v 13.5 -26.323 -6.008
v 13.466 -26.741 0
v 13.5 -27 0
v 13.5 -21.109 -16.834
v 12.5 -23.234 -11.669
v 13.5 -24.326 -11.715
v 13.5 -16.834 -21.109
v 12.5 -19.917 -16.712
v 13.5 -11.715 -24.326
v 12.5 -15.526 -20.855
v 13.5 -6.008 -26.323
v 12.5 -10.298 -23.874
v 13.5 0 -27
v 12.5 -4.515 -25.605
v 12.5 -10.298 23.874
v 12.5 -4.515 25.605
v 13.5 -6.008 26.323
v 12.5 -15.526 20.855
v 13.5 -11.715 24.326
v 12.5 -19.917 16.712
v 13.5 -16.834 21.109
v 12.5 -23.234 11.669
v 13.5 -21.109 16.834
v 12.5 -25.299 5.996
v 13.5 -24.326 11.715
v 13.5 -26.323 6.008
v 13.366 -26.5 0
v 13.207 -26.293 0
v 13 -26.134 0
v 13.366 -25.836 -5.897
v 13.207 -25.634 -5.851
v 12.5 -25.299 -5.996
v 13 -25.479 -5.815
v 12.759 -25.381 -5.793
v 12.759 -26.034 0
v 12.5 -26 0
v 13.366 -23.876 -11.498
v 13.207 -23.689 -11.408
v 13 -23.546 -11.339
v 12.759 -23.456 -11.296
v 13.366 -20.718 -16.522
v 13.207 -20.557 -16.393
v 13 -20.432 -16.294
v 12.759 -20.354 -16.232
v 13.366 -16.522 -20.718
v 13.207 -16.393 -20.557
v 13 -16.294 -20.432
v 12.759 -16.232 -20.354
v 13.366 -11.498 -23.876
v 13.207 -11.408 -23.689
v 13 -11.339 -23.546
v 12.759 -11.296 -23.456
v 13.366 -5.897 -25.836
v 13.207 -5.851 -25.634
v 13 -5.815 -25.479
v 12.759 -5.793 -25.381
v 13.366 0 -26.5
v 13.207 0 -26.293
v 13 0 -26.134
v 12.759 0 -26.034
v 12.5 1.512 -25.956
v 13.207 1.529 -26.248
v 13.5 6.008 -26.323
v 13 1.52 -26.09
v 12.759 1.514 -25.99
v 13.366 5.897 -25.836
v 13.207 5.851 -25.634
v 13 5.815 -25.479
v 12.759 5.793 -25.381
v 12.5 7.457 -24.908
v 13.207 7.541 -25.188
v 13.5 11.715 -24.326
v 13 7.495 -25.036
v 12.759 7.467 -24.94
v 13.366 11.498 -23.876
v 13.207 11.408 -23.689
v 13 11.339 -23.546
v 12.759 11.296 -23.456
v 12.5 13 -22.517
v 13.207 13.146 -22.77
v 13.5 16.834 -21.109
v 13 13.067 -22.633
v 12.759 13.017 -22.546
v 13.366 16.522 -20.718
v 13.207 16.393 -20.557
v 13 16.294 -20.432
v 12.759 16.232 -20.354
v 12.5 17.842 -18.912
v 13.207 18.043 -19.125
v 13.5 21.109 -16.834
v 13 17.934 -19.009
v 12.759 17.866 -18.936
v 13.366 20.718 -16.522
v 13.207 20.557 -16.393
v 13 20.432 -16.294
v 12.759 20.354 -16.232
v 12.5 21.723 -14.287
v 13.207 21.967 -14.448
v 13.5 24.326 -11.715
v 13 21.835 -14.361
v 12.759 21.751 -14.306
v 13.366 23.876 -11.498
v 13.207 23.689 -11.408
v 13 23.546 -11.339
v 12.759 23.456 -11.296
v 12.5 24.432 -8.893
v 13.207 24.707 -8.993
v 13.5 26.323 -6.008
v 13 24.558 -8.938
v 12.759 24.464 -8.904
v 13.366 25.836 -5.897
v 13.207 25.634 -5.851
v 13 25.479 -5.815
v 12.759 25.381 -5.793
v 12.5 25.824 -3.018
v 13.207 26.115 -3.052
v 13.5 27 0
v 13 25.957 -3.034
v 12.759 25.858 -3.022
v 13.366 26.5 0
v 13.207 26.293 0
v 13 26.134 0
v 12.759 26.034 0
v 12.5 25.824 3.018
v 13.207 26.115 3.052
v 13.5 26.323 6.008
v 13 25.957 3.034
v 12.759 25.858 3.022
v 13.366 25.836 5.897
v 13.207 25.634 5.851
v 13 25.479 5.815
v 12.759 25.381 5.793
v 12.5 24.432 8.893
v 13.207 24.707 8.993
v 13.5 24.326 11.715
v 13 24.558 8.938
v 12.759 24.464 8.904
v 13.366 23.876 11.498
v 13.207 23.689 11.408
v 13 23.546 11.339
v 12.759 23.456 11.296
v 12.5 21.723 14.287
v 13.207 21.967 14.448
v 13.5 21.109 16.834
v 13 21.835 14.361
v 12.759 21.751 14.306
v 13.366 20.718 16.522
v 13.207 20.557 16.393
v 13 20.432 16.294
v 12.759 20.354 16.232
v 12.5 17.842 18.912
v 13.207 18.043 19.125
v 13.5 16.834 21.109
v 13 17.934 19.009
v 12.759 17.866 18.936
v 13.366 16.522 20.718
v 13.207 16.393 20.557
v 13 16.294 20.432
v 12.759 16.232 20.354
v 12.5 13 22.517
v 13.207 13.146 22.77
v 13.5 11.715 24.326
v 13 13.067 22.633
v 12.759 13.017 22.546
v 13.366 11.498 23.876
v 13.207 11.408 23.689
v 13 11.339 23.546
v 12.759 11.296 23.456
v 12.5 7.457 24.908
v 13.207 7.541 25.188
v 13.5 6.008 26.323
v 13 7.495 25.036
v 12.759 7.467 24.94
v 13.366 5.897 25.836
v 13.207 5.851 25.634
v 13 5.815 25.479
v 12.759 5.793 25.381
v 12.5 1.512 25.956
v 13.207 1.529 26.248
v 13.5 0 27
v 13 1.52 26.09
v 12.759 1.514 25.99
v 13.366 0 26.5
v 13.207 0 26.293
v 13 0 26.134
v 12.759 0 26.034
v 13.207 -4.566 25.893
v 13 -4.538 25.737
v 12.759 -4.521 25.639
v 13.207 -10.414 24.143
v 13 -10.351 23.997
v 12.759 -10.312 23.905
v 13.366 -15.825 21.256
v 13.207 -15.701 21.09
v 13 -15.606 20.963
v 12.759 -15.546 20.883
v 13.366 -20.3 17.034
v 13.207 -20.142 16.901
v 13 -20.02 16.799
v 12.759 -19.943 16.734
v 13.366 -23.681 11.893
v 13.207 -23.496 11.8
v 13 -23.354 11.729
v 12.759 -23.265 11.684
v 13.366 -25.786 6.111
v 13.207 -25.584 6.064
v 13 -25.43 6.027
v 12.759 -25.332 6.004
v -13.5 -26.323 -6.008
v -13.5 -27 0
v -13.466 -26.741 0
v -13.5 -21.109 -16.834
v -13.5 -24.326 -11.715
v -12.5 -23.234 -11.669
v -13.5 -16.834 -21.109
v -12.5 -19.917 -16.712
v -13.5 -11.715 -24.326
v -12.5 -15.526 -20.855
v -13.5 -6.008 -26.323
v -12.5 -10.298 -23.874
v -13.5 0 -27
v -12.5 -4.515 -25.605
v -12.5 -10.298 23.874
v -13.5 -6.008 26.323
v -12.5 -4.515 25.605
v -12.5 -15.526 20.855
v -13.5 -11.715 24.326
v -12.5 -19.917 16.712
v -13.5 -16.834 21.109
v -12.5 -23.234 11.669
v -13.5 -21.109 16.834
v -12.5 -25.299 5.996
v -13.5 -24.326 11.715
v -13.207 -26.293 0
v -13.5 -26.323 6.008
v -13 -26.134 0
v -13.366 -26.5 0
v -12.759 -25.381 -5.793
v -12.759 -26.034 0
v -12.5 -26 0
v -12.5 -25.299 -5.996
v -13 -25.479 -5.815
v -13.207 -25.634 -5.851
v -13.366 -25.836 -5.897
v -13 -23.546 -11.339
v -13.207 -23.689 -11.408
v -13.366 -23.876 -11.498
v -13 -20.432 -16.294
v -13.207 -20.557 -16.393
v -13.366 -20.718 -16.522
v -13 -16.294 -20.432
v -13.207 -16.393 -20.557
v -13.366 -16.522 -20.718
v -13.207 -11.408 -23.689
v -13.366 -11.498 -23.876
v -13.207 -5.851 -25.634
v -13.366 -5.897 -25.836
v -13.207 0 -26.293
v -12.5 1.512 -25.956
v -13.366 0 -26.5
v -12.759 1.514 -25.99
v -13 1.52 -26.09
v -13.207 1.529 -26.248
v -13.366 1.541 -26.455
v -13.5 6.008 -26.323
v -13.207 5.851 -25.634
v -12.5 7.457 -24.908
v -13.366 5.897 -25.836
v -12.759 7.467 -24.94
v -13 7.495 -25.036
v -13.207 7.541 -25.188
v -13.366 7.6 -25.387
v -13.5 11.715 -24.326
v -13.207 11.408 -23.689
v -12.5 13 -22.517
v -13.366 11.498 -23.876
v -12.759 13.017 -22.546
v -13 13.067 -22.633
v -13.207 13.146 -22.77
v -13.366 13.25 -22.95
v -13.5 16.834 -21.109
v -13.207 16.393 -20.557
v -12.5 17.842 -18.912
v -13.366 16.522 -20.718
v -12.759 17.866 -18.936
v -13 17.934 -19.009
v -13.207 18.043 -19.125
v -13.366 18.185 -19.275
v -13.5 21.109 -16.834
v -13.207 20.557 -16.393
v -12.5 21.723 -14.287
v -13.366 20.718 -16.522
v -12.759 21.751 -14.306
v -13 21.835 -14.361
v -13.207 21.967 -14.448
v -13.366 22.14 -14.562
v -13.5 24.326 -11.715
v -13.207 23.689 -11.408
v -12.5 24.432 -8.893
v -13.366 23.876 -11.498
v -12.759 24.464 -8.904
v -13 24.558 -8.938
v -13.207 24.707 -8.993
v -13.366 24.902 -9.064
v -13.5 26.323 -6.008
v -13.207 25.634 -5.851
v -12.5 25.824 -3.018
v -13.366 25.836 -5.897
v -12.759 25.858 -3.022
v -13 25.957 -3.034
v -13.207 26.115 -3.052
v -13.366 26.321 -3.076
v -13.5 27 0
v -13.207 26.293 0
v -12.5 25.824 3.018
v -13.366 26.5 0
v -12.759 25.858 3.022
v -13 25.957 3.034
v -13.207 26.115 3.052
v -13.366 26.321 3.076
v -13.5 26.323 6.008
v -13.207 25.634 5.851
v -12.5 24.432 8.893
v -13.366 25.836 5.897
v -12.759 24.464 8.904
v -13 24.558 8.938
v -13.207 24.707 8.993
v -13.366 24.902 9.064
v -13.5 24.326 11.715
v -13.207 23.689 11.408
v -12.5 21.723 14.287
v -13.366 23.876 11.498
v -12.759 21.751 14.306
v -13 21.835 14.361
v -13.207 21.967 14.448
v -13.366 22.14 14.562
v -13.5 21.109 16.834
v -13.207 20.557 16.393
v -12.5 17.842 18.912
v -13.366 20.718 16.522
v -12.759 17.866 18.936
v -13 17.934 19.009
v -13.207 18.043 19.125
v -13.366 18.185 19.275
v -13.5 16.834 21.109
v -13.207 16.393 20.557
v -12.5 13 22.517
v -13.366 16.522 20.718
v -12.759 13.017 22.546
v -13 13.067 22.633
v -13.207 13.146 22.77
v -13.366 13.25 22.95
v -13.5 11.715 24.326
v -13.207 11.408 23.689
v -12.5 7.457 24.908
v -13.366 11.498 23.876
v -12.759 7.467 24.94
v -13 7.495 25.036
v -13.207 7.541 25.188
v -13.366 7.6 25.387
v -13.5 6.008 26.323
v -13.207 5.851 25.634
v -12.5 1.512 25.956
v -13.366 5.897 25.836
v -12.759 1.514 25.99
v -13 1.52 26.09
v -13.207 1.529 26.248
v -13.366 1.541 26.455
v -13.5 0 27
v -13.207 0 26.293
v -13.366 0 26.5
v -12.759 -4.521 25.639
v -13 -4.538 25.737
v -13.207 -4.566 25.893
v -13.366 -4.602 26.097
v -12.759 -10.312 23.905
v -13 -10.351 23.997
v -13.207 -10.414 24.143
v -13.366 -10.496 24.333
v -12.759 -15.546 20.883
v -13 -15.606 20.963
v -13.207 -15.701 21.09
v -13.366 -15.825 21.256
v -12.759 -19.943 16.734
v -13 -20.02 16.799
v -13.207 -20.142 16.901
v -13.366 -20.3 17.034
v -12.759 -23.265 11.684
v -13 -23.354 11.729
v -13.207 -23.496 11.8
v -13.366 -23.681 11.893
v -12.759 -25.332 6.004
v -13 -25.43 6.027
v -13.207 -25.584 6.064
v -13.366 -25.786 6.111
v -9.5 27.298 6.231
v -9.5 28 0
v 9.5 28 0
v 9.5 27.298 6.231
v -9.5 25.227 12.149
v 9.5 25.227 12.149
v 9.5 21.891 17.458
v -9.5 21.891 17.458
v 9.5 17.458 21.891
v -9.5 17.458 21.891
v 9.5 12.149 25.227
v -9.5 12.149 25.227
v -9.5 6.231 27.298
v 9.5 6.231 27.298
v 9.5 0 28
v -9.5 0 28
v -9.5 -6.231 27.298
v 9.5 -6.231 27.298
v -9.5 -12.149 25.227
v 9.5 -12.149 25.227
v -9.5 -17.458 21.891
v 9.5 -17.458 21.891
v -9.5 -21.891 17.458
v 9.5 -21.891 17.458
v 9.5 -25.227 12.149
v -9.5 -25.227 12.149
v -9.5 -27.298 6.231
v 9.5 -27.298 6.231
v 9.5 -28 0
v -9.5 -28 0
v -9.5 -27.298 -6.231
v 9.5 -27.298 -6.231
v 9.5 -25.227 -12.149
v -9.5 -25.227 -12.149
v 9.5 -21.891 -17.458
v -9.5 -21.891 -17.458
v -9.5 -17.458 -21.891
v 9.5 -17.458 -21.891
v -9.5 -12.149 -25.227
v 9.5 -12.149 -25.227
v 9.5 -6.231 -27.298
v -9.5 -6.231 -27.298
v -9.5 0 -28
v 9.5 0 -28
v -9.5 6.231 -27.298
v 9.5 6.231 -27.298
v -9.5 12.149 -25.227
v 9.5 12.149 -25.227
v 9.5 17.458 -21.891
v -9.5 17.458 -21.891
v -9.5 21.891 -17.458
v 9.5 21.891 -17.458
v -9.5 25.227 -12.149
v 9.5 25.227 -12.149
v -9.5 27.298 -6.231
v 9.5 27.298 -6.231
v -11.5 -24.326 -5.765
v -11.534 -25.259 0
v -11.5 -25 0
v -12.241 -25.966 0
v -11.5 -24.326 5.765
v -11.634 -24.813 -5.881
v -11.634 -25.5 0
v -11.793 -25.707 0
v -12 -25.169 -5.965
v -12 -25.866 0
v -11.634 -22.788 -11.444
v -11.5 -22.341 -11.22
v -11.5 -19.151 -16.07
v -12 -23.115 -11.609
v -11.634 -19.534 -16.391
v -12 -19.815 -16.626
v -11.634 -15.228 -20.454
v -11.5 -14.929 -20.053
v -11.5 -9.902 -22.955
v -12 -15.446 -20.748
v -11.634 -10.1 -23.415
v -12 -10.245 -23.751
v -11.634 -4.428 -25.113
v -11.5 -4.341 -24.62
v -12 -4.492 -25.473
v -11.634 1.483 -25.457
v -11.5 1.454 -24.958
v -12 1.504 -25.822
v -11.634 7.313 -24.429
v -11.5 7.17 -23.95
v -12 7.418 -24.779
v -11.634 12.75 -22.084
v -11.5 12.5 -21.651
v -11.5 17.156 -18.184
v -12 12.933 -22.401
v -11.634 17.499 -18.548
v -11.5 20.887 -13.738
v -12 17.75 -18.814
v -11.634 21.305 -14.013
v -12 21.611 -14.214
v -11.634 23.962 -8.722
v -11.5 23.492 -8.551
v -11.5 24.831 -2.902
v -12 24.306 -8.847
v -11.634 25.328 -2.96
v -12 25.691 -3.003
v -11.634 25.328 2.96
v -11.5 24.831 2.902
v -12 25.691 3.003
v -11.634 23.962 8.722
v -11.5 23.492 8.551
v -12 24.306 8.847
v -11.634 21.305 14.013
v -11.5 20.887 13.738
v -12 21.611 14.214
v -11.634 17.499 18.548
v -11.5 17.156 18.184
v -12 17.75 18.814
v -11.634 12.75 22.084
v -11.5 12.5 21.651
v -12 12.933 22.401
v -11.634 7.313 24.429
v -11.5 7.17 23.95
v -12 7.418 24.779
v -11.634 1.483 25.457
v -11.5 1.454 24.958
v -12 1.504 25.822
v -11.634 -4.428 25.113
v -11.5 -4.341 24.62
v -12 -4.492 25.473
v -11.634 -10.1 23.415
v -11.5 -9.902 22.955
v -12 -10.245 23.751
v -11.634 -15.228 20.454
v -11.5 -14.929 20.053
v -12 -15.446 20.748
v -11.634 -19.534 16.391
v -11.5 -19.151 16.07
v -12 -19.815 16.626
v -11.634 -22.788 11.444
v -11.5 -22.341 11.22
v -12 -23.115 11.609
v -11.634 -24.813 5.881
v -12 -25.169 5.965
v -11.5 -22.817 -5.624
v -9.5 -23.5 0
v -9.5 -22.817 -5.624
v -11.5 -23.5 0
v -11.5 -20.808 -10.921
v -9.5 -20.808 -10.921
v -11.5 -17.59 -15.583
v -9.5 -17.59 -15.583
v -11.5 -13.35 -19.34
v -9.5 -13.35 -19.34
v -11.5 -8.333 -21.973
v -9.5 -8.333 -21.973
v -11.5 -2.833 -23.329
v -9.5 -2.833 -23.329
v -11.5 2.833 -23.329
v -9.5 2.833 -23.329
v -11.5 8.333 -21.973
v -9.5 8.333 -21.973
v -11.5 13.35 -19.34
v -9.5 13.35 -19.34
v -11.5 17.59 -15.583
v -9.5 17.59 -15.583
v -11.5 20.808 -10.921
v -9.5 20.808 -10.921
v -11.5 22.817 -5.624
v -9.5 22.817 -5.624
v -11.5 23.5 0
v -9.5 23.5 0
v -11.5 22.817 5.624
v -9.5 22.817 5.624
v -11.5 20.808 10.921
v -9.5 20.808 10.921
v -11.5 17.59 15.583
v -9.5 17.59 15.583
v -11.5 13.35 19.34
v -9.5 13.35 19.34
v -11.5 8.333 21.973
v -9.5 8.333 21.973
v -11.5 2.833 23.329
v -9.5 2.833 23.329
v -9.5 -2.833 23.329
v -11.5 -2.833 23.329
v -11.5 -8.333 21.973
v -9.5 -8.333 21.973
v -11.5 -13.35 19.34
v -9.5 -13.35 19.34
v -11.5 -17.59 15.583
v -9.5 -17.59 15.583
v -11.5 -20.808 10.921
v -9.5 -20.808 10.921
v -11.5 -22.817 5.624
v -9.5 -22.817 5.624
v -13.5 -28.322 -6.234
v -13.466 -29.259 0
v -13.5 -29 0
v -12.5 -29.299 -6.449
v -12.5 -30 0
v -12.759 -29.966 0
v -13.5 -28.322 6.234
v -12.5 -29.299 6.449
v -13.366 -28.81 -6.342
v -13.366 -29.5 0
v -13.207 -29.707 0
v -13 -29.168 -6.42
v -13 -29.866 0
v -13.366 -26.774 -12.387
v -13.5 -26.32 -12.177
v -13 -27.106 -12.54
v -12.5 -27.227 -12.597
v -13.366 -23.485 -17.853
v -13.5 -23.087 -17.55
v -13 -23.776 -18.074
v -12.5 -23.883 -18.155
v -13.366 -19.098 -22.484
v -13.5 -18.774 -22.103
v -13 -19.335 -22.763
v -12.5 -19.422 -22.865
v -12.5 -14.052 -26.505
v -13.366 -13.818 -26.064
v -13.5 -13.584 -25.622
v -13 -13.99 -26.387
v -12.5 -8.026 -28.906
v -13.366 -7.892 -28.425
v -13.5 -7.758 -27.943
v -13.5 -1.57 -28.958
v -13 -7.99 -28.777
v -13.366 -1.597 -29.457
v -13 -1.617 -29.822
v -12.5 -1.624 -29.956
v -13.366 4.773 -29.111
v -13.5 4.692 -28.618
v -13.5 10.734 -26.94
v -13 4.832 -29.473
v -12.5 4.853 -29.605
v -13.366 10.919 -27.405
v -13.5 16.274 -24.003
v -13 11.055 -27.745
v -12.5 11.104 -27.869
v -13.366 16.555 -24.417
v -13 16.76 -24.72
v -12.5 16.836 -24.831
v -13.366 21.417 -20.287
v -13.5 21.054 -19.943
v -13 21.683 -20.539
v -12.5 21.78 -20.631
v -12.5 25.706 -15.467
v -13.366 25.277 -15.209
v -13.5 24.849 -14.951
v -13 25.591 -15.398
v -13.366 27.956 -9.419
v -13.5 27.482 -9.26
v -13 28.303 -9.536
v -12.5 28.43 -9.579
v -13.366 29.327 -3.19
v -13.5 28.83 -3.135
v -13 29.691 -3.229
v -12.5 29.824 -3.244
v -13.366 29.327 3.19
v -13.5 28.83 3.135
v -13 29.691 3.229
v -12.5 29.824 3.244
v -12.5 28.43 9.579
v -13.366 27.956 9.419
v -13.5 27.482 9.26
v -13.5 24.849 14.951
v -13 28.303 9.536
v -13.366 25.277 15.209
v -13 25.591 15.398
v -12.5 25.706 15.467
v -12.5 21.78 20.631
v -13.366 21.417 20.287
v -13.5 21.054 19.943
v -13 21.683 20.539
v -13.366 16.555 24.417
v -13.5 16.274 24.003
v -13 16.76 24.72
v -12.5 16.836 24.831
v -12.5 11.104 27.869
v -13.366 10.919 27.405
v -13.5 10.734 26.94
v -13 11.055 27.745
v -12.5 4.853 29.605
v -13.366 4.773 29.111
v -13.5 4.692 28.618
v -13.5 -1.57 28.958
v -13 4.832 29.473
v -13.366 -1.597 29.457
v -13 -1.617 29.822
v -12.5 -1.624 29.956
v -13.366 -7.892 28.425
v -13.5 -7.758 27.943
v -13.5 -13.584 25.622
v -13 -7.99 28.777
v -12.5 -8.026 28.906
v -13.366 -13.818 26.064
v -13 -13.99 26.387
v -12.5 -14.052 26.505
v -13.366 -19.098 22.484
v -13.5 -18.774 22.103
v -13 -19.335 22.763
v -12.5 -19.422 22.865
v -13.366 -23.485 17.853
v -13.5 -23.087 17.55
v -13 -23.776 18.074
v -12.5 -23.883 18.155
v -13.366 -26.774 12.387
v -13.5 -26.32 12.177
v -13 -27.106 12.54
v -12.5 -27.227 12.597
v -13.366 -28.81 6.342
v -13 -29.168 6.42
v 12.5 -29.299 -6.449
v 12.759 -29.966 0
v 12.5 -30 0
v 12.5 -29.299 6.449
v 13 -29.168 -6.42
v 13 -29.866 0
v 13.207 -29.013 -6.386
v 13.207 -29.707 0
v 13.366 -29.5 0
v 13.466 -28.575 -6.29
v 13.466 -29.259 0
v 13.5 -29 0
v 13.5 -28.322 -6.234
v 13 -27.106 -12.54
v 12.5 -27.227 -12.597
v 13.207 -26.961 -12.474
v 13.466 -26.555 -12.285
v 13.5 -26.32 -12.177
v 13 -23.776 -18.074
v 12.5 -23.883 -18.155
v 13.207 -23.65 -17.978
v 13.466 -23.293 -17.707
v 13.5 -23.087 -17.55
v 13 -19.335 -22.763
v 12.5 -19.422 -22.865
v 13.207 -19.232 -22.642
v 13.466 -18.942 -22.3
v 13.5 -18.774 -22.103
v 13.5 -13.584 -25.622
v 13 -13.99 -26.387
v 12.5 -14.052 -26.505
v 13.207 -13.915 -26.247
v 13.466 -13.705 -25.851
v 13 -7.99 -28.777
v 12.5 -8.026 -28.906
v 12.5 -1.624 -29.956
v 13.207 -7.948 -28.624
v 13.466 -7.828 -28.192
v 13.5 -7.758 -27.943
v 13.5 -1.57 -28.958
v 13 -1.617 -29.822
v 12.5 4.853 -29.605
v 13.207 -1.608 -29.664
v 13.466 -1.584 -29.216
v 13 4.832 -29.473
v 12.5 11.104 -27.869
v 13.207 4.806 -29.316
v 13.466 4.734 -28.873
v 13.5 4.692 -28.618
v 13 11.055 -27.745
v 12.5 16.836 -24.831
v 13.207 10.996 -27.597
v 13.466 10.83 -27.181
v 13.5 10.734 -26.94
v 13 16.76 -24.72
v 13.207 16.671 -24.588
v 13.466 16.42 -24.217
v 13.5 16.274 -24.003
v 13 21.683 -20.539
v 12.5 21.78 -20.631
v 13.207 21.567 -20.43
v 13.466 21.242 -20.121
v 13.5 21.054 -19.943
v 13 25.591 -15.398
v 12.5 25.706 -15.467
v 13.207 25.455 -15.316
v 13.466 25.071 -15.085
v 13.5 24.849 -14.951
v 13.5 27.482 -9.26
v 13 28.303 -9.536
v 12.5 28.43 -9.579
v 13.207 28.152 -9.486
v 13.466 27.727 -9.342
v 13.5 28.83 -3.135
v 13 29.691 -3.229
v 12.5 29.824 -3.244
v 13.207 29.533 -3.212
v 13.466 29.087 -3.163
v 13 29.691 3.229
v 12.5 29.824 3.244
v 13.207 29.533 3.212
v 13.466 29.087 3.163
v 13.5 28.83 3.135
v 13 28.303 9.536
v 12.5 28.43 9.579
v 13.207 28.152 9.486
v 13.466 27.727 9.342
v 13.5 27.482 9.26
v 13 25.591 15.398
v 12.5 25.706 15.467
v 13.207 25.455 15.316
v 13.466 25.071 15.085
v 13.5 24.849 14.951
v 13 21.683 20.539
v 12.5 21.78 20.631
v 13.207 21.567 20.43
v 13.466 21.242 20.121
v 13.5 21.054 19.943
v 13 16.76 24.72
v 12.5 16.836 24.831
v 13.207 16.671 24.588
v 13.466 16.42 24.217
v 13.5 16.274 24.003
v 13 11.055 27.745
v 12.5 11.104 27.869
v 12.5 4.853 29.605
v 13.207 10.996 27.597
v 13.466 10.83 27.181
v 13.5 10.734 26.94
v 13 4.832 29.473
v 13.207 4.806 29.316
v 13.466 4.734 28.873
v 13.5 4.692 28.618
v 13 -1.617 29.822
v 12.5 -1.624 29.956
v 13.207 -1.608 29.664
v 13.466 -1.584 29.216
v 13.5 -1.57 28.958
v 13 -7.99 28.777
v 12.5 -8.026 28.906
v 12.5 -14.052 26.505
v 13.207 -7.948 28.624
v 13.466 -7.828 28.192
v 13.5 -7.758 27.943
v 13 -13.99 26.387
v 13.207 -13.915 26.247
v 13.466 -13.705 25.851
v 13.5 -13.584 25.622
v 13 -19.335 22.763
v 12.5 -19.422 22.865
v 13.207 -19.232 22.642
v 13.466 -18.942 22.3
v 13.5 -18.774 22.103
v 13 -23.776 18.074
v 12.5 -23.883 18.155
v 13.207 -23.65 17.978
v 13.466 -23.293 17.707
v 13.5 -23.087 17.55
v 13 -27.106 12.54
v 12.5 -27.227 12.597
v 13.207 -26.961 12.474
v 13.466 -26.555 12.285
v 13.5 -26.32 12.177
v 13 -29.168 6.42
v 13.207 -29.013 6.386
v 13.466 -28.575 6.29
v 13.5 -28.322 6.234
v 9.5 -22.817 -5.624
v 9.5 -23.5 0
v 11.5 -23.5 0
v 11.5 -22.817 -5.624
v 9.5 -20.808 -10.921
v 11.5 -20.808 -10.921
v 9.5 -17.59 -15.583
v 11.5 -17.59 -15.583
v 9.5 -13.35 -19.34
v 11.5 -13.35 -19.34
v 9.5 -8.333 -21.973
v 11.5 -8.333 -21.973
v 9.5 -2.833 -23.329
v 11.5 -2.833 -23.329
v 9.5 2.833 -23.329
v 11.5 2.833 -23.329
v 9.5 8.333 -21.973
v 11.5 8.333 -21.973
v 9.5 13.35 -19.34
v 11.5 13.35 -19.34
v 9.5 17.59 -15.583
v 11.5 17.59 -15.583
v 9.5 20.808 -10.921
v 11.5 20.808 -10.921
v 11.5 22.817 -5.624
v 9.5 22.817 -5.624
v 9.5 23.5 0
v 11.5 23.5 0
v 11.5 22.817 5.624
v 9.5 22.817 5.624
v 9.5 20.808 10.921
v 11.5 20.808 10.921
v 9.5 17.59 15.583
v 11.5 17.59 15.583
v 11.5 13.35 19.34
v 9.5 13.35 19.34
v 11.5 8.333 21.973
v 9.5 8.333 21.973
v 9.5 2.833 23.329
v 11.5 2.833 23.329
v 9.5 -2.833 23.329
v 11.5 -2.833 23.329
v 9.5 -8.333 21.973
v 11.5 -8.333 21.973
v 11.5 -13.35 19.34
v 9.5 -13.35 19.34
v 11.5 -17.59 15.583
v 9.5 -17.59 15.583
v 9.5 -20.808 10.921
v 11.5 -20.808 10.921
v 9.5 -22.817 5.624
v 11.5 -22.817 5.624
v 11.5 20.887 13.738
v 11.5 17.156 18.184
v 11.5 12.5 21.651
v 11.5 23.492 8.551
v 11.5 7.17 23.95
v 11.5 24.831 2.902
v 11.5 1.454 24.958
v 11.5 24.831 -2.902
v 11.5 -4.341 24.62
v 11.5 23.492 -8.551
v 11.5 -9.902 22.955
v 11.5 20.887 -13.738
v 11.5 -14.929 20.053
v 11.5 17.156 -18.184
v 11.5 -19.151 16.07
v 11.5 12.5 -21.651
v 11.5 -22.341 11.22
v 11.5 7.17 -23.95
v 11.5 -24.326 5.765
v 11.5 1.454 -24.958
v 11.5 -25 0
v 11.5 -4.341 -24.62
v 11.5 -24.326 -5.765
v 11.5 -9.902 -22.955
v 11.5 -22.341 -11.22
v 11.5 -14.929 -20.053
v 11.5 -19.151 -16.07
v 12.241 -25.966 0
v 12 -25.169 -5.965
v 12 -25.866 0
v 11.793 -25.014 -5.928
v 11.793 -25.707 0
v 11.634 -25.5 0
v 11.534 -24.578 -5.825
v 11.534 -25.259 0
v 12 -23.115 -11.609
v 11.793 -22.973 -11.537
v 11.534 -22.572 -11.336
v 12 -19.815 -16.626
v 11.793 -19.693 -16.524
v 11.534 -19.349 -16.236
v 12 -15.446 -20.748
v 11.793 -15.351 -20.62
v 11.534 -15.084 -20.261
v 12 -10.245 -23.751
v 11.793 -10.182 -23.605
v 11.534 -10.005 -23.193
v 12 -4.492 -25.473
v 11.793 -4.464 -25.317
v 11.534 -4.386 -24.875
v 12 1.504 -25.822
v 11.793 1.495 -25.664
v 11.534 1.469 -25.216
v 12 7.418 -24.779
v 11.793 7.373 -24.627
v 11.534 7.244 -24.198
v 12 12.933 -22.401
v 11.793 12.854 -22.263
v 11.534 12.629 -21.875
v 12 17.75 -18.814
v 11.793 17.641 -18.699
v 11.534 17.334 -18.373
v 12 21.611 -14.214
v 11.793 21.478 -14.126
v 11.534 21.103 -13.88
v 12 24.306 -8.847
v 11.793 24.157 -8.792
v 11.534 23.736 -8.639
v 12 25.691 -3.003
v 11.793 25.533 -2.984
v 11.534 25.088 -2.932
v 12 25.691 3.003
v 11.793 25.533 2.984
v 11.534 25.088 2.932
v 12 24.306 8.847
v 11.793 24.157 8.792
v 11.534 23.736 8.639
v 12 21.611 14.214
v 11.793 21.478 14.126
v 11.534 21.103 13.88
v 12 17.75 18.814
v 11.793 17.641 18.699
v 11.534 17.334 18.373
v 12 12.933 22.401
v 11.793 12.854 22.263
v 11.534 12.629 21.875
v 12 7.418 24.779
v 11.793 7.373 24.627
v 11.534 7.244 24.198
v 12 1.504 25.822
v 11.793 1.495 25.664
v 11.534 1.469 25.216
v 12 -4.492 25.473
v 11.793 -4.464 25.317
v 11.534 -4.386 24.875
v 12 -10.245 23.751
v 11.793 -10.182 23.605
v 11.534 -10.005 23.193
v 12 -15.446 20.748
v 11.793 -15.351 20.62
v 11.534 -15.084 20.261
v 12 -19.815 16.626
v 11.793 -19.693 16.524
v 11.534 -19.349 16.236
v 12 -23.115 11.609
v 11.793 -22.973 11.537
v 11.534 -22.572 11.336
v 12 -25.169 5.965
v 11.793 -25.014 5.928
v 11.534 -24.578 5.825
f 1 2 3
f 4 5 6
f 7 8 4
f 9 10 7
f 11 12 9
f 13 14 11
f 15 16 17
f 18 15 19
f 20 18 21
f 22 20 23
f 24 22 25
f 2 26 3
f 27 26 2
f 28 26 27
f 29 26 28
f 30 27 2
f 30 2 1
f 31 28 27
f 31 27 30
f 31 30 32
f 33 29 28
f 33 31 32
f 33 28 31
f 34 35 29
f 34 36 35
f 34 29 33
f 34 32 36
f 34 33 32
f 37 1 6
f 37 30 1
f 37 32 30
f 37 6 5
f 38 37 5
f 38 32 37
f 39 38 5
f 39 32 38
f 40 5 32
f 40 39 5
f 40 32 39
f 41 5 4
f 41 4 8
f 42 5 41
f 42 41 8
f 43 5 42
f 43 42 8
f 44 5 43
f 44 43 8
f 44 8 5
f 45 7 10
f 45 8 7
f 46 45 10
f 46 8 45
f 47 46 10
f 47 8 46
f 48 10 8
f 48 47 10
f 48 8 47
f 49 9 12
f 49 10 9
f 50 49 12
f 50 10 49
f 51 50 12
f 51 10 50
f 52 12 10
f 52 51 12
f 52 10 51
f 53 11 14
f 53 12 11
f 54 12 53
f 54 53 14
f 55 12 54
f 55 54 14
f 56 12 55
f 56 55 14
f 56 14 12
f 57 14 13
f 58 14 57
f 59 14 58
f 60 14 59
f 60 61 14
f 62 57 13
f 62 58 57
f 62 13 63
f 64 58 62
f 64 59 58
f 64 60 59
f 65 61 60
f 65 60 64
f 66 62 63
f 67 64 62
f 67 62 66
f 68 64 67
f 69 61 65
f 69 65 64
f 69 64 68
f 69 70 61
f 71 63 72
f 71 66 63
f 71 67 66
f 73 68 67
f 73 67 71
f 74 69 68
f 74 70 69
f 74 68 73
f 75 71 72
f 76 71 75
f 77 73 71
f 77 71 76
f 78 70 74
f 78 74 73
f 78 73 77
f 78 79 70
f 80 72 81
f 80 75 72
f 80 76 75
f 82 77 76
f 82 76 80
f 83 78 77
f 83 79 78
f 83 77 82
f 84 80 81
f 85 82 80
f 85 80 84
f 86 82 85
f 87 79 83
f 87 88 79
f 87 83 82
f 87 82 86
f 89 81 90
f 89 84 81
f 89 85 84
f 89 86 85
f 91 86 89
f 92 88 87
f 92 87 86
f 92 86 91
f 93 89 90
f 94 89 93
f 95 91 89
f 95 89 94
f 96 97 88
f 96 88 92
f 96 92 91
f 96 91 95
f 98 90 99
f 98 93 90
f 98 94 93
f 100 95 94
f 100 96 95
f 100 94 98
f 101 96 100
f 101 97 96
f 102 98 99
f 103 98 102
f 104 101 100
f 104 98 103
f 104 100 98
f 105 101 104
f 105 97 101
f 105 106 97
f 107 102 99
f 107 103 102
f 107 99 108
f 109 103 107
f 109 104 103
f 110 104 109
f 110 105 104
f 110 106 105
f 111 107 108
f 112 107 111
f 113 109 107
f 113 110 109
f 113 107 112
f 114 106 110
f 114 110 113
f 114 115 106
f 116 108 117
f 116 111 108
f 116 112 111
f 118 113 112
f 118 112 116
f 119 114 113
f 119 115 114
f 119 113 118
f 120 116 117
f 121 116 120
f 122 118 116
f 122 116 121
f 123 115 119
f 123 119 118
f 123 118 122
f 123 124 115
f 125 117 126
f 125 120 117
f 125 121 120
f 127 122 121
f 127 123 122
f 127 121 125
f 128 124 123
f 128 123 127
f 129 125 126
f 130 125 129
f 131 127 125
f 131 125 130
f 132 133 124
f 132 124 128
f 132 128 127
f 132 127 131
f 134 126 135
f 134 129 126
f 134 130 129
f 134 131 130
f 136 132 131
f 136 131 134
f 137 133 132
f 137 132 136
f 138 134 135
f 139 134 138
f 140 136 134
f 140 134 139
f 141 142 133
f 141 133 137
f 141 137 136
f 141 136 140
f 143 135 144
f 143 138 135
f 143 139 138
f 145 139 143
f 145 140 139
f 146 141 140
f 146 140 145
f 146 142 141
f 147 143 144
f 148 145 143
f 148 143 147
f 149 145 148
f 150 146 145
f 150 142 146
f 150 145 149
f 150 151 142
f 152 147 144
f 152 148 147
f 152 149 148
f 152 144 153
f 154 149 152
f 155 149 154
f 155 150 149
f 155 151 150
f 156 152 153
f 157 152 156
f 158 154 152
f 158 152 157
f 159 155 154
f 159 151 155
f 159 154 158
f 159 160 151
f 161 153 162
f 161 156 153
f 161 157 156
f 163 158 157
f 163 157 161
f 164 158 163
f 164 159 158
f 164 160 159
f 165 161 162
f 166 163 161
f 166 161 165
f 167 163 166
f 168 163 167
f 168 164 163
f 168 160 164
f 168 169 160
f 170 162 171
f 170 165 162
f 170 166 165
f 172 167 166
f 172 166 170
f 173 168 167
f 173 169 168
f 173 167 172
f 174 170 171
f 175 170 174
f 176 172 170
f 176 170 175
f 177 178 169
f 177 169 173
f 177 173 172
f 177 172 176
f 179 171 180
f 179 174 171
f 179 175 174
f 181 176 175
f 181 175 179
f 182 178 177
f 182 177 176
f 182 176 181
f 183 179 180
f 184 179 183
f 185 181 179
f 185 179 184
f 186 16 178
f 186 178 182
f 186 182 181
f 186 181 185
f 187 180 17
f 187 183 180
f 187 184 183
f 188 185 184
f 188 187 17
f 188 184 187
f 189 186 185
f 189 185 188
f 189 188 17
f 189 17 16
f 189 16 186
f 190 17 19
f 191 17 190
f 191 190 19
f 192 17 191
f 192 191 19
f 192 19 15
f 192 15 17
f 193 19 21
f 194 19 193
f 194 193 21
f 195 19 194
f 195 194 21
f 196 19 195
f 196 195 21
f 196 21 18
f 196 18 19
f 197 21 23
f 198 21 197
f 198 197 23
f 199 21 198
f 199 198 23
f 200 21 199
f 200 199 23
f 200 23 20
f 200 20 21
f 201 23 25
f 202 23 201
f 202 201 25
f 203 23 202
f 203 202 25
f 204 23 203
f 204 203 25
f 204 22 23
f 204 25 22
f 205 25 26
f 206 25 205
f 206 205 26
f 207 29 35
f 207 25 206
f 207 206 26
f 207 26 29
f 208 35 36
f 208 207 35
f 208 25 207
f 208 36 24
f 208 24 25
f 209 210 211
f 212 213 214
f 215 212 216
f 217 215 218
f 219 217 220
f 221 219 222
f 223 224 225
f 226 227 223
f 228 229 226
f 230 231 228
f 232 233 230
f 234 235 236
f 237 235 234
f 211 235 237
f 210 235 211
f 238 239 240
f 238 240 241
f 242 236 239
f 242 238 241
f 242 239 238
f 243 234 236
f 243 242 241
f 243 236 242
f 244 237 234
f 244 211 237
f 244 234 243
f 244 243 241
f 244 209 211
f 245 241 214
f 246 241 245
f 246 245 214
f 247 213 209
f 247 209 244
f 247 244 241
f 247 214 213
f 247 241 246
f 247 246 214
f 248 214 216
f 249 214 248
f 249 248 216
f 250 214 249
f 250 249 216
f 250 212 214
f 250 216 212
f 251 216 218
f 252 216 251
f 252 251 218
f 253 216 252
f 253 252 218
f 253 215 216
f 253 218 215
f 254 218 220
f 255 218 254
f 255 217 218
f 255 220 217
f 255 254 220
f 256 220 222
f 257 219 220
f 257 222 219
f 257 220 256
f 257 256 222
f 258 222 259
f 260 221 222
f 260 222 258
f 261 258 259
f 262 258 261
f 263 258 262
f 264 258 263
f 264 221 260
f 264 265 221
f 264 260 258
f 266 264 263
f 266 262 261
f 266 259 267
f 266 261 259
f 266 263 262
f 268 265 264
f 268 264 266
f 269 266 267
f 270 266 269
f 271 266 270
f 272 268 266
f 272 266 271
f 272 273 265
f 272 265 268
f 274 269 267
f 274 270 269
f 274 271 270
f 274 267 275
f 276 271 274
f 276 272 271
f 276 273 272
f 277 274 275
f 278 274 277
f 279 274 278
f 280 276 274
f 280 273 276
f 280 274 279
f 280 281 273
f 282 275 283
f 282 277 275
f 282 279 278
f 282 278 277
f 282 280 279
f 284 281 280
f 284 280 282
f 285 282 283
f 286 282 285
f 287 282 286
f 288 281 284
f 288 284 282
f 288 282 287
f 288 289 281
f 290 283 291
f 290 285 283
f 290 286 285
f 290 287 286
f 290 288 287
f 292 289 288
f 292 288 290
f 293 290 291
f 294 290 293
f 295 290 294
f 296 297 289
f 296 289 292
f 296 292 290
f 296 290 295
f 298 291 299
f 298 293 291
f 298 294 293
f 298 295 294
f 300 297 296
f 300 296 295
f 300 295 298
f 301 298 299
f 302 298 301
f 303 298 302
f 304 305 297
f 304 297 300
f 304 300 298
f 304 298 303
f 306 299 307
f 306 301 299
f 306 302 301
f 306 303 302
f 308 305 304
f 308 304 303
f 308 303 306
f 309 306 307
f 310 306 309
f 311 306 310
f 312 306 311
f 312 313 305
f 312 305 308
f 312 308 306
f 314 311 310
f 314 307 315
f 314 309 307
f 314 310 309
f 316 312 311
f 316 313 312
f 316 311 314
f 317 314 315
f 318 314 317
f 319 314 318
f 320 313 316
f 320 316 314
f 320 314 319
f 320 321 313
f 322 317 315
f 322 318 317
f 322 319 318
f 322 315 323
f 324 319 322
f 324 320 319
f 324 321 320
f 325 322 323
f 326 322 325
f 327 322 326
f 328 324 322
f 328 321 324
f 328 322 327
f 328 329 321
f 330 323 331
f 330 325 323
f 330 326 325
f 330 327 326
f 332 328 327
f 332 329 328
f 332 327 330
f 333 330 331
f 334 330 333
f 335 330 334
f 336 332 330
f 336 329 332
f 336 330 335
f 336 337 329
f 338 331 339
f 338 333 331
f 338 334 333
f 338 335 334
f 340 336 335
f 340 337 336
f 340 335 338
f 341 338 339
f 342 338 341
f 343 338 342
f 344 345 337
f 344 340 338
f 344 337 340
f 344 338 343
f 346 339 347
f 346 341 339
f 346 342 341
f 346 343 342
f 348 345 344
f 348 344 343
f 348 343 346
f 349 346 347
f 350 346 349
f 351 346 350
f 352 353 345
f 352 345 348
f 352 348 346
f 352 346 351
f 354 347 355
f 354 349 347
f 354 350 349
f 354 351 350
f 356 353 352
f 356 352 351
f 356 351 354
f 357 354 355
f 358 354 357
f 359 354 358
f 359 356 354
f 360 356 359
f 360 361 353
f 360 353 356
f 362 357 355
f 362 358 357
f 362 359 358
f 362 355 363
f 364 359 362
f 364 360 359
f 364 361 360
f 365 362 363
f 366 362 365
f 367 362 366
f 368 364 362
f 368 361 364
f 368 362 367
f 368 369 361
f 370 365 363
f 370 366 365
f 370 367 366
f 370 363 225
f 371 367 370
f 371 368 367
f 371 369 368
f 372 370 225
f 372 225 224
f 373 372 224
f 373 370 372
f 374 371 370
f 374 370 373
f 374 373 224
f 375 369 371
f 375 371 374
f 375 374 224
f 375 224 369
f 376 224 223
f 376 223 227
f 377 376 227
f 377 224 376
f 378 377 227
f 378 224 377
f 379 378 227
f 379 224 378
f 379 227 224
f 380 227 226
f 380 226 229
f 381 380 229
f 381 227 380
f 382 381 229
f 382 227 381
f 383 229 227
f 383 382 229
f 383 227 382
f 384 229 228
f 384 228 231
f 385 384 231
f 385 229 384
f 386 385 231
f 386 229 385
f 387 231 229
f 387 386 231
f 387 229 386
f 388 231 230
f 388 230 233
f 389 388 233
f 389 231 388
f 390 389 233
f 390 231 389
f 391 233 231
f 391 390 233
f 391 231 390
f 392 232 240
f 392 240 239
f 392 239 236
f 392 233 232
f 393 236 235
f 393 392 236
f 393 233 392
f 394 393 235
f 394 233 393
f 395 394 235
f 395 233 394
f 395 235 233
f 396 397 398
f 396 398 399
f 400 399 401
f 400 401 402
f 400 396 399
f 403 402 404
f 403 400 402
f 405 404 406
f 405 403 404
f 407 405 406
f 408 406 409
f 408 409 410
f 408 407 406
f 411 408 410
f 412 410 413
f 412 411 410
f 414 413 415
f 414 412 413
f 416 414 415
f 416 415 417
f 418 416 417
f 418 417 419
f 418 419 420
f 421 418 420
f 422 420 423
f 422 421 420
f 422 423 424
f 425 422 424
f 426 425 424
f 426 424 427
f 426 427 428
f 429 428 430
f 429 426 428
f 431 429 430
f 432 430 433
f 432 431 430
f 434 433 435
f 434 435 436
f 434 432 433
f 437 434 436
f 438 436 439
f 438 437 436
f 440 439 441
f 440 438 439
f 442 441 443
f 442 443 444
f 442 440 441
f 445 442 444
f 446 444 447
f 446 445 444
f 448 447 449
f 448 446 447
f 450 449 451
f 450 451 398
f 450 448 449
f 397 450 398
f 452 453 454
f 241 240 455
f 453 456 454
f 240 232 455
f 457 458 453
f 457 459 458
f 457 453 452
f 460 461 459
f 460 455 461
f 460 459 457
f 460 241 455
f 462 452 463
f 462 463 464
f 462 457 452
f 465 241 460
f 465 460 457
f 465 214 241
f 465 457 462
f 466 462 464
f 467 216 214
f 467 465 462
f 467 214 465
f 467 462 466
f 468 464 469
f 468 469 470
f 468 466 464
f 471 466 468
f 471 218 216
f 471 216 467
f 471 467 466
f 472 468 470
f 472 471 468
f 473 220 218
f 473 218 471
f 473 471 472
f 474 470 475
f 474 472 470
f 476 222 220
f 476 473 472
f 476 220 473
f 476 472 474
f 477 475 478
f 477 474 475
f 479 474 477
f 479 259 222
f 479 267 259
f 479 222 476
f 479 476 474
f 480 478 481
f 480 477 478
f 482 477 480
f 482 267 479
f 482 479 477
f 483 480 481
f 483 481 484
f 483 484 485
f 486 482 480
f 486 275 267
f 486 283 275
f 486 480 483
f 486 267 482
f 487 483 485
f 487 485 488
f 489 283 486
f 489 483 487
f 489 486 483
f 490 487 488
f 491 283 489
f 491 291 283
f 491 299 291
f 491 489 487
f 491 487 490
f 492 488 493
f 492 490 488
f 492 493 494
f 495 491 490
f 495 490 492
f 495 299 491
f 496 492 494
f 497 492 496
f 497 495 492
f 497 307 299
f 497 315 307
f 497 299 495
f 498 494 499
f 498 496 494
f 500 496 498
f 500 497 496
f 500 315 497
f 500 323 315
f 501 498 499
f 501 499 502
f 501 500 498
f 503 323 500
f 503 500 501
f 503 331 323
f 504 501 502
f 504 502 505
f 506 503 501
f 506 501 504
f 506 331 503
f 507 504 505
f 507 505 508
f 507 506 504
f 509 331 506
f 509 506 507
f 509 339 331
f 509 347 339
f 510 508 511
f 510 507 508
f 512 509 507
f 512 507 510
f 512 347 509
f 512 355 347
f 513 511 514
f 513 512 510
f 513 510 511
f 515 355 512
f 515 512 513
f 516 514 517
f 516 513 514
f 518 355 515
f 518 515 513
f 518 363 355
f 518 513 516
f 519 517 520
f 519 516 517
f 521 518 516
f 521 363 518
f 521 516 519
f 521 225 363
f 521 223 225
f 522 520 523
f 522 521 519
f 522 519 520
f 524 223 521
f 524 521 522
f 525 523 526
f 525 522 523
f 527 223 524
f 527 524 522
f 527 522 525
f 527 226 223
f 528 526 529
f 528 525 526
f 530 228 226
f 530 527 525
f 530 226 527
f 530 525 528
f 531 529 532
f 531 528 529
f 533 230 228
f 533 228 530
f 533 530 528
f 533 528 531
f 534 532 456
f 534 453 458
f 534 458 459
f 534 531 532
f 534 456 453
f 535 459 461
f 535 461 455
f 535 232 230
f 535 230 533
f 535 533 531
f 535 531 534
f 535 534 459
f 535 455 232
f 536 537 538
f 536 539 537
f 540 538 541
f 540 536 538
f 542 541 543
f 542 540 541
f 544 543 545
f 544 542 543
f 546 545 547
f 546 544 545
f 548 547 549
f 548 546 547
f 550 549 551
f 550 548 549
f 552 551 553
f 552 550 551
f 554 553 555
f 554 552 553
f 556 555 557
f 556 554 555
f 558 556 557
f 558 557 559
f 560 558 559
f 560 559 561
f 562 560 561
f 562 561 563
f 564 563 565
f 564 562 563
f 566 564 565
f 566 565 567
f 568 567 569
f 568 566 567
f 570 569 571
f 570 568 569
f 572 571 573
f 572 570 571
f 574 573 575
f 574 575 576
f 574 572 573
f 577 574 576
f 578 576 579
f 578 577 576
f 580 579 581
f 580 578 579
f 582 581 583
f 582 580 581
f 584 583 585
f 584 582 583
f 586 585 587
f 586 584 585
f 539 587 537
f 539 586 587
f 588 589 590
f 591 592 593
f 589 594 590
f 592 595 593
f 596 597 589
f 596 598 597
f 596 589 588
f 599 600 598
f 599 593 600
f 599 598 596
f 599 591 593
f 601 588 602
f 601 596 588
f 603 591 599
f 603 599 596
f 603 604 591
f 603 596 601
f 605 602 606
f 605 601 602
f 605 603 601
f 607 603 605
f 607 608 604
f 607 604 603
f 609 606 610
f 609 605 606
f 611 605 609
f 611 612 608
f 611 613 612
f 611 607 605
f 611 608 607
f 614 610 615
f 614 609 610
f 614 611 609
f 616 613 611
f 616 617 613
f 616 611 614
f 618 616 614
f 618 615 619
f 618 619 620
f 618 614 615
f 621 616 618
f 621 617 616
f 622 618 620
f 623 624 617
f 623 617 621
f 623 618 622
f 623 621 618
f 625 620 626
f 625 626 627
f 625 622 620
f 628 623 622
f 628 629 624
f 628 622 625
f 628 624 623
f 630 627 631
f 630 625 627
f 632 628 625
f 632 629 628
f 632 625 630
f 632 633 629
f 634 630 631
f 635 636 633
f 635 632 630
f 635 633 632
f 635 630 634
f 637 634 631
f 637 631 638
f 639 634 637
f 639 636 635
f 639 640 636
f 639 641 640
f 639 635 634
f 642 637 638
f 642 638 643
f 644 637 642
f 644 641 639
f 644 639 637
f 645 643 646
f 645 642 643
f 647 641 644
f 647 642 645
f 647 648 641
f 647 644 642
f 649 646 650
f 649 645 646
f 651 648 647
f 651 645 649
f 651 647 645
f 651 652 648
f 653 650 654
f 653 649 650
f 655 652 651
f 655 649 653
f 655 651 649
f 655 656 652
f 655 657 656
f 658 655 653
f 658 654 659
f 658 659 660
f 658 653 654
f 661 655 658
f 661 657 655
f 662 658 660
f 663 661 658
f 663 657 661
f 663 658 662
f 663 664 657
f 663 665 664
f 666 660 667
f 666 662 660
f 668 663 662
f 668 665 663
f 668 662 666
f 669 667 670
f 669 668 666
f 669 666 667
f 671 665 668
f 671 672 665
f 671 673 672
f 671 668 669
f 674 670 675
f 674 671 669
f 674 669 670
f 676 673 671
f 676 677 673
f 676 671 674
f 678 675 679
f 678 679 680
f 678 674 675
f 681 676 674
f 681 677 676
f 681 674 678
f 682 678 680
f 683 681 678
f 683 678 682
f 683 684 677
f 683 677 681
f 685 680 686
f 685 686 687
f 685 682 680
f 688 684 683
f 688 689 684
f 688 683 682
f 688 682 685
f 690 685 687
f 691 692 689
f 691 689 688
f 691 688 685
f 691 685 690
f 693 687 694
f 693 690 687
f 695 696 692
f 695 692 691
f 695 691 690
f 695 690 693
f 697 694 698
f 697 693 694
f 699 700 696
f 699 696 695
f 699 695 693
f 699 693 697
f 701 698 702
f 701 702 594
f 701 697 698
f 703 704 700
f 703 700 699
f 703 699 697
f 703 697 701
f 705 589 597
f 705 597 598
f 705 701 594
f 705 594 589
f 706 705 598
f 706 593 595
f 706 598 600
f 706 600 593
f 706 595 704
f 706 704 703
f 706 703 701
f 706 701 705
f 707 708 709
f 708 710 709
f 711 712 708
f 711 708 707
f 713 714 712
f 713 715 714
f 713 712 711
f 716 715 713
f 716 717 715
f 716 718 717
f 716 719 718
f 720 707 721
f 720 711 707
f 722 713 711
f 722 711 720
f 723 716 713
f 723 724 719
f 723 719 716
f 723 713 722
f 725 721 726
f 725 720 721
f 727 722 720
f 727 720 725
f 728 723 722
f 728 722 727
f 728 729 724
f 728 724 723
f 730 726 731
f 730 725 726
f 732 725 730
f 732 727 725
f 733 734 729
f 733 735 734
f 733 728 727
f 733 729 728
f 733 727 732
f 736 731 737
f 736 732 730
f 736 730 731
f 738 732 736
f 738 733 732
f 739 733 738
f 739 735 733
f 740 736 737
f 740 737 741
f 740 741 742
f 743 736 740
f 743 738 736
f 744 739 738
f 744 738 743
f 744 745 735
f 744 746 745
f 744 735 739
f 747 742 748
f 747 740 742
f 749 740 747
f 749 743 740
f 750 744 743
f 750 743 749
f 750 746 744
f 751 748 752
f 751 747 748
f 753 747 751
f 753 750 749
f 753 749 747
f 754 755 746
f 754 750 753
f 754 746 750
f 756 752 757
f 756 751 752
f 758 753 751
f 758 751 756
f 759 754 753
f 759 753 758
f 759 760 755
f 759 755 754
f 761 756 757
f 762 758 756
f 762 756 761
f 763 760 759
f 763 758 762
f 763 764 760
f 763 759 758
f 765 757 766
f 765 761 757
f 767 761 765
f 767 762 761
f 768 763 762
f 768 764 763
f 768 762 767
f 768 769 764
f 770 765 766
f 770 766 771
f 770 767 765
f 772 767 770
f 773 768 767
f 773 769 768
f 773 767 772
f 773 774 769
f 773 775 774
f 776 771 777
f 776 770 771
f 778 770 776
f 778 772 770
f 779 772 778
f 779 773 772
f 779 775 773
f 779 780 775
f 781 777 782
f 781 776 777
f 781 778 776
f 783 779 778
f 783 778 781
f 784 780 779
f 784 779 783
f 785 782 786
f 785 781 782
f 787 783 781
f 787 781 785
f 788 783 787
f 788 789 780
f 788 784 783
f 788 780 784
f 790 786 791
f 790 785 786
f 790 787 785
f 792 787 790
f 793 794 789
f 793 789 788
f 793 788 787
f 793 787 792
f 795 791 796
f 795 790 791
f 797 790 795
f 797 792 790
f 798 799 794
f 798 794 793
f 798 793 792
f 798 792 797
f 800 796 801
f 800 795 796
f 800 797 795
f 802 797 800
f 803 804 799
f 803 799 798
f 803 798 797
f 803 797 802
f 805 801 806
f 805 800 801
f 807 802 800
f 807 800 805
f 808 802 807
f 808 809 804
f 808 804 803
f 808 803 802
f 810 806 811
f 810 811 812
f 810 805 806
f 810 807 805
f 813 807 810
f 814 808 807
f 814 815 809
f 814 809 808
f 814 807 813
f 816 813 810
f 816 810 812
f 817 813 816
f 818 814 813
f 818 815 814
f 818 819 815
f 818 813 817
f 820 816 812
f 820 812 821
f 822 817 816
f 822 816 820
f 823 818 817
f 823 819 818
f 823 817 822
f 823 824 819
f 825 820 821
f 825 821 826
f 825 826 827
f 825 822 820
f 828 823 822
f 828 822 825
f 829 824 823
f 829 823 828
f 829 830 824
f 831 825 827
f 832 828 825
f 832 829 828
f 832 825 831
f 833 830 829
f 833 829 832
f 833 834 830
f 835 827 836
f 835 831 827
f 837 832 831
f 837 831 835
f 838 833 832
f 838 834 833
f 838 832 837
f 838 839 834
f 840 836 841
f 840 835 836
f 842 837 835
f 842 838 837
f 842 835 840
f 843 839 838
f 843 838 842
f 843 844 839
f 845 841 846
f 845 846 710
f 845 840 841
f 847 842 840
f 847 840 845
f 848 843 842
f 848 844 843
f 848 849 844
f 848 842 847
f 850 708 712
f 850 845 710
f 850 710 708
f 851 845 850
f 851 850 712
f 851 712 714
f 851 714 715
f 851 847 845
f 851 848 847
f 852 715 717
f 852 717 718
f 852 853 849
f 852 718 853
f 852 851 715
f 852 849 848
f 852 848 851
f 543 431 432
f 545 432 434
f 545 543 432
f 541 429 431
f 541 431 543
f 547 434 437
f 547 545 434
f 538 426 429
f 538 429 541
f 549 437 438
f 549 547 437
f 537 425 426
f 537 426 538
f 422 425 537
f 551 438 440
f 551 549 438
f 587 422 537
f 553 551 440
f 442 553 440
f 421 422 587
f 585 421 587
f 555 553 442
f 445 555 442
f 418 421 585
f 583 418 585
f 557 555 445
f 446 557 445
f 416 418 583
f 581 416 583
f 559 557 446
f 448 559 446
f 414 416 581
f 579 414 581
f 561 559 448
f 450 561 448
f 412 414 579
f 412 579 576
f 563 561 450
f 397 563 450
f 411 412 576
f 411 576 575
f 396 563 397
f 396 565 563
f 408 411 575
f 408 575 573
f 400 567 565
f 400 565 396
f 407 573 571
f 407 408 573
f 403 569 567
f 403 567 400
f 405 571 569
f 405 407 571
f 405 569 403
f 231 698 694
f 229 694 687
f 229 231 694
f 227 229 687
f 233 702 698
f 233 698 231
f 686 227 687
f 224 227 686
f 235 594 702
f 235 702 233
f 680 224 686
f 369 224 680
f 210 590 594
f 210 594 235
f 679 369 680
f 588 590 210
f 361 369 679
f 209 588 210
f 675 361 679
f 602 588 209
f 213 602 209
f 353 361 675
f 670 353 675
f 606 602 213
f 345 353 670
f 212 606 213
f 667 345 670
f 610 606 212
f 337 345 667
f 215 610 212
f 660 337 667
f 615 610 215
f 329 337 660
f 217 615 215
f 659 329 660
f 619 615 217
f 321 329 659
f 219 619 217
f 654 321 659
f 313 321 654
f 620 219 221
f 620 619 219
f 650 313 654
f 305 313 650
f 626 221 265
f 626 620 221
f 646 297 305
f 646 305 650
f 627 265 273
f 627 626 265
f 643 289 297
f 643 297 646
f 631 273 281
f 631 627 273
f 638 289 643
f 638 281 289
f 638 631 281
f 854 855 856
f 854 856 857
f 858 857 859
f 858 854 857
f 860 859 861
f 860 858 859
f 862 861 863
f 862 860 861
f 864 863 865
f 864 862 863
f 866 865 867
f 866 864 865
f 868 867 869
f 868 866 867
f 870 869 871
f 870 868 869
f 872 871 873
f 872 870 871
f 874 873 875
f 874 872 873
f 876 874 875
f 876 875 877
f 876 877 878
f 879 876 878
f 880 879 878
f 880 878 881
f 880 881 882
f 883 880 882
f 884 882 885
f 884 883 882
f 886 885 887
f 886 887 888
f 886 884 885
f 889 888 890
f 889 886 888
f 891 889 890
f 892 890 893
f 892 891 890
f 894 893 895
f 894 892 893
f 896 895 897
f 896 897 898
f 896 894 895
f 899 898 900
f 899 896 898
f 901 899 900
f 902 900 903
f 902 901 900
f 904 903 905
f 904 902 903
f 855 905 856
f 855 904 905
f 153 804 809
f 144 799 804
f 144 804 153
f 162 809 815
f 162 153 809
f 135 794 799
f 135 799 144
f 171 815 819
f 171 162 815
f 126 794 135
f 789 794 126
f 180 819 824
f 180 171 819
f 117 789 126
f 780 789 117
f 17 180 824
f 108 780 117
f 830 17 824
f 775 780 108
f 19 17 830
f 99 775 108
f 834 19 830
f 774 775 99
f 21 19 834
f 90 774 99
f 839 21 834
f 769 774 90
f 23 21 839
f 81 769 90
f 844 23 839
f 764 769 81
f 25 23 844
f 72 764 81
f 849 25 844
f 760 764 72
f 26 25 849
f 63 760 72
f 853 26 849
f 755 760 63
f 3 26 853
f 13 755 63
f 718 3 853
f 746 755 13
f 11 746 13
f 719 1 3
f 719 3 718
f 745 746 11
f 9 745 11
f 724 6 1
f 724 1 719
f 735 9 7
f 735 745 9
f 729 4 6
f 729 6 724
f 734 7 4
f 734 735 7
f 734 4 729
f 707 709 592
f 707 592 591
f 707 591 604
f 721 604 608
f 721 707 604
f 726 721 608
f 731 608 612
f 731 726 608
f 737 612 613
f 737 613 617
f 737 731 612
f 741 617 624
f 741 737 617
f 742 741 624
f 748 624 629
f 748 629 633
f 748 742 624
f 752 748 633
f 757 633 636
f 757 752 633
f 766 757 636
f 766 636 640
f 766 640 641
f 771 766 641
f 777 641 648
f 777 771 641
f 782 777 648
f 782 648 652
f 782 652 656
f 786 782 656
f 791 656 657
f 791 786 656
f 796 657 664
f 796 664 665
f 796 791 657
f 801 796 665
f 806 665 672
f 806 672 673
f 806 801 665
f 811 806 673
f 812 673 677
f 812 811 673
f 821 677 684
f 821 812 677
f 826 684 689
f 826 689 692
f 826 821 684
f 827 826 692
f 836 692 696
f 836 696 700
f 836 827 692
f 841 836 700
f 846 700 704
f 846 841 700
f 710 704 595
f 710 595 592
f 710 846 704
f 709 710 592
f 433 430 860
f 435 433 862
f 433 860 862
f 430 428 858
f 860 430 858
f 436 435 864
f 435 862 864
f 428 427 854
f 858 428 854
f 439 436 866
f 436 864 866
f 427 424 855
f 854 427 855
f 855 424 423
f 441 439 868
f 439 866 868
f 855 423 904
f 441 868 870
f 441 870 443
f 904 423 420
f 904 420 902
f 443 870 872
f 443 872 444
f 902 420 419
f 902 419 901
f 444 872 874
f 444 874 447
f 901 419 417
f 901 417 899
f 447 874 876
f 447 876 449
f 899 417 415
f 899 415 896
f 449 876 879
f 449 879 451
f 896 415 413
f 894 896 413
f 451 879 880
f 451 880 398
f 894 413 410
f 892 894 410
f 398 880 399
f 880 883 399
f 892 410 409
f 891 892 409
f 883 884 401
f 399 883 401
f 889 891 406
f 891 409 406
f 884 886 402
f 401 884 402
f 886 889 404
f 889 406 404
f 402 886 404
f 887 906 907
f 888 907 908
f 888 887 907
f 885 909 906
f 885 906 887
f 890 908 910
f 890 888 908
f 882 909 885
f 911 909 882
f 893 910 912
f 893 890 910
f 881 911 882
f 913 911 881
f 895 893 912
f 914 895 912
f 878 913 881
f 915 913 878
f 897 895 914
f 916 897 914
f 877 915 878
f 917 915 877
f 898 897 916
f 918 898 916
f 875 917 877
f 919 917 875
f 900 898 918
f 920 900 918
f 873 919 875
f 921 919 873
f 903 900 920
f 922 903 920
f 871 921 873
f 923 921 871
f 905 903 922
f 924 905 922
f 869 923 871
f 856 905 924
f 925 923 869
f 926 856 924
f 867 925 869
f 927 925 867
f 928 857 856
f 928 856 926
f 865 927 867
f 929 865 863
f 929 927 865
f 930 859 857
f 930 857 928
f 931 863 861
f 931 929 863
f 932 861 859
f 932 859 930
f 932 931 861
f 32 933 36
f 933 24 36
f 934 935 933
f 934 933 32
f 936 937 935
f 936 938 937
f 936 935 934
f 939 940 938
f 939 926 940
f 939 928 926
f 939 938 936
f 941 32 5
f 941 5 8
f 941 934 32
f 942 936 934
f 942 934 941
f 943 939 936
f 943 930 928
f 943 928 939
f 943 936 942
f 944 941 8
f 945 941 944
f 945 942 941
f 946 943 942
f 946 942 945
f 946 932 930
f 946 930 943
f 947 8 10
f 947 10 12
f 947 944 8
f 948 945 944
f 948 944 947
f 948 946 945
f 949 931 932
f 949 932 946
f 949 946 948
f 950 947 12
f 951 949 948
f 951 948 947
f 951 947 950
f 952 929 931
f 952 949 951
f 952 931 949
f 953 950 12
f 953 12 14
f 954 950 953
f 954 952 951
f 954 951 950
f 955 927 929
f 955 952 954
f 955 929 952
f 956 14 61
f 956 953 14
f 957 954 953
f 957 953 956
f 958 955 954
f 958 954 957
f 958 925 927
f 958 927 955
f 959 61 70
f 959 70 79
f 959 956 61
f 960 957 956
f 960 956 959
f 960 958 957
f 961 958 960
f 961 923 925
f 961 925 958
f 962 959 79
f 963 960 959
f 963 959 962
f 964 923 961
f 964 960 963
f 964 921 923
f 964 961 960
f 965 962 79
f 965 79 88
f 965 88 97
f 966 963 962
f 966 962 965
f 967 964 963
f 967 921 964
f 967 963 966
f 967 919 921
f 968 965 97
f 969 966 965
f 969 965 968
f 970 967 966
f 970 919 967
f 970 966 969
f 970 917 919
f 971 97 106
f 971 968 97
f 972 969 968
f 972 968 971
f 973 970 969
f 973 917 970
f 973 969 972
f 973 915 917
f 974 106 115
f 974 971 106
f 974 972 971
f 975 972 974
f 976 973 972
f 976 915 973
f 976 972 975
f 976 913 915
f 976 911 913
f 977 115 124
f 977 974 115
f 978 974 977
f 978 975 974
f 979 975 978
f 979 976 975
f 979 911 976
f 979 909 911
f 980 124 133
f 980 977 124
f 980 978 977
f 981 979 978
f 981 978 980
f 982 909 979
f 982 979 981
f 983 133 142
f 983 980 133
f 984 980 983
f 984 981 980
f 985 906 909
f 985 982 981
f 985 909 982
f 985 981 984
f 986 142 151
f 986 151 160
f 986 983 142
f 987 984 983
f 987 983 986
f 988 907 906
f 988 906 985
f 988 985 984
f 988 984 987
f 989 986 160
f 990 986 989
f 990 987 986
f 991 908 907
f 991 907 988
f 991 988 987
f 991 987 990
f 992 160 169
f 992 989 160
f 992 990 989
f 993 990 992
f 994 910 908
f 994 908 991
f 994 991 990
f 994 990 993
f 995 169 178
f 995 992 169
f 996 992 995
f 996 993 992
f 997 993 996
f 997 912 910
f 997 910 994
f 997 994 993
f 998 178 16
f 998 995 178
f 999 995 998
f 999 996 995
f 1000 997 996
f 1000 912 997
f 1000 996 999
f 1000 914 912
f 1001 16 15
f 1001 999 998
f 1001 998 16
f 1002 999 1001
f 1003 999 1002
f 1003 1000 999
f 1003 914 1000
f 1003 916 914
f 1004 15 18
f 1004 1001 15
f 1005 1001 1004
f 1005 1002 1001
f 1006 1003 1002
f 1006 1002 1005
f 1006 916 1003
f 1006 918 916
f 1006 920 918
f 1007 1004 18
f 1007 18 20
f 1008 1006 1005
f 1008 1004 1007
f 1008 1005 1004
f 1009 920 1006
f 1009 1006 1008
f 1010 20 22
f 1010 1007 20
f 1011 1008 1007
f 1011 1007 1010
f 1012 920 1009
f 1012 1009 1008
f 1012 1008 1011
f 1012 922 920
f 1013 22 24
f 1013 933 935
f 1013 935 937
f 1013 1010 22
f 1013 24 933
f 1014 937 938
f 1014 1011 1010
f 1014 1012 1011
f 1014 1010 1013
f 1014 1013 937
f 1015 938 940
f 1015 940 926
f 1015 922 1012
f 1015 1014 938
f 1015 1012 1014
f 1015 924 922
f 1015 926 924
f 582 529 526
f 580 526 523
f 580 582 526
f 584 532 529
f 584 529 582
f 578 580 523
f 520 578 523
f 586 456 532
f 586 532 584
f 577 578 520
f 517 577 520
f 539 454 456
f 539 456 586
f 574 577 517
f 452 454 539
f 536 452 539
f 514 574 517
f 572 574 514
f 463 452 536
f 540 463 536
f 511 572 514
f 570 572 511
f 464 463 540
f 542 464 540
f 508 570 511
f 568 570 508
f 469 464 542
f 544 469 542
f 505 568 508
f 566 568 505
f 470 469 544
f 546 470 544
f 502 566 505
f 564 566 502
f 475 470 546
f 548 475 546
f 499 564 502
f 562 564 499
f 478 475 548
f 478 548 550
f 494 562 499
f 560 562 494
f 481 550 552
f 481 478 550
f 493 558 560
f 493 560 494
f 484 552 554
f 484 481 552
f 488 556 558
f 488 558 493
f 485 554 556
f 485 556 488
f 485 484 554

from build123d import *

# Parameters (mm, degrees)
SHELL1_START       = -9.5
SHELL1_OUTLINE_R   = 28
SHELL1_OUTLINE_R_2 = 23.5
SHELL1_DEPTH       = 19
FILLET1_R          = 1


# Read off the part's stored shape, not the designer's step: Shell1
with BuildPart() as part:
    # Sketch1 → Revolve1 (revolve)
    with BuildSketch(Plane.XY, mode=Mode.PRIVATE) as revolve1_sk:
        Polygon((-11.5, 23.5), (-11.5, 26), (-13.5, 26), (-13.5, 30), (13.5, 30), (13.5, 26), (11.5, 26), (11.5, 23.5), align=None)
    revolve(revolve1_sk.sketch.rotate(Axis((-11.5, 0, 0), (1, 0, 0)), 180), axis=Axis((-11.5, 0, 0), (1, 0, 0)))

    # Shell1 outline → Shell1 (cut)
    with BuildSketch(Plane.YZ.offset(SHELL1_START)):
        Circle(SHELL1_OUTLINE_R)
        Circle(SHELL1_OUTLINE_R_2, mode=Mode.SUBTRACT)
    extrude(amount=SHELL1_DEPTH, mode=Mode.SUBTRACT)

    # Fillet1
    fillet1_edges = [part.edges().sort_by_distance(p)[0] for p in [
        (11.5, 26, 0),
        (13.5, 26, 0),
        (13.5, 30, 0),
        (-13.5, 30, 0),
        (-13.5, 26, 0),
        (-11.5, 26, 0),
    ]]
    fillet(fillet1_edges, radius=FILLET1_R - 0.0001)  # a hair under: the kernel refuses the full size


solid = part.part
